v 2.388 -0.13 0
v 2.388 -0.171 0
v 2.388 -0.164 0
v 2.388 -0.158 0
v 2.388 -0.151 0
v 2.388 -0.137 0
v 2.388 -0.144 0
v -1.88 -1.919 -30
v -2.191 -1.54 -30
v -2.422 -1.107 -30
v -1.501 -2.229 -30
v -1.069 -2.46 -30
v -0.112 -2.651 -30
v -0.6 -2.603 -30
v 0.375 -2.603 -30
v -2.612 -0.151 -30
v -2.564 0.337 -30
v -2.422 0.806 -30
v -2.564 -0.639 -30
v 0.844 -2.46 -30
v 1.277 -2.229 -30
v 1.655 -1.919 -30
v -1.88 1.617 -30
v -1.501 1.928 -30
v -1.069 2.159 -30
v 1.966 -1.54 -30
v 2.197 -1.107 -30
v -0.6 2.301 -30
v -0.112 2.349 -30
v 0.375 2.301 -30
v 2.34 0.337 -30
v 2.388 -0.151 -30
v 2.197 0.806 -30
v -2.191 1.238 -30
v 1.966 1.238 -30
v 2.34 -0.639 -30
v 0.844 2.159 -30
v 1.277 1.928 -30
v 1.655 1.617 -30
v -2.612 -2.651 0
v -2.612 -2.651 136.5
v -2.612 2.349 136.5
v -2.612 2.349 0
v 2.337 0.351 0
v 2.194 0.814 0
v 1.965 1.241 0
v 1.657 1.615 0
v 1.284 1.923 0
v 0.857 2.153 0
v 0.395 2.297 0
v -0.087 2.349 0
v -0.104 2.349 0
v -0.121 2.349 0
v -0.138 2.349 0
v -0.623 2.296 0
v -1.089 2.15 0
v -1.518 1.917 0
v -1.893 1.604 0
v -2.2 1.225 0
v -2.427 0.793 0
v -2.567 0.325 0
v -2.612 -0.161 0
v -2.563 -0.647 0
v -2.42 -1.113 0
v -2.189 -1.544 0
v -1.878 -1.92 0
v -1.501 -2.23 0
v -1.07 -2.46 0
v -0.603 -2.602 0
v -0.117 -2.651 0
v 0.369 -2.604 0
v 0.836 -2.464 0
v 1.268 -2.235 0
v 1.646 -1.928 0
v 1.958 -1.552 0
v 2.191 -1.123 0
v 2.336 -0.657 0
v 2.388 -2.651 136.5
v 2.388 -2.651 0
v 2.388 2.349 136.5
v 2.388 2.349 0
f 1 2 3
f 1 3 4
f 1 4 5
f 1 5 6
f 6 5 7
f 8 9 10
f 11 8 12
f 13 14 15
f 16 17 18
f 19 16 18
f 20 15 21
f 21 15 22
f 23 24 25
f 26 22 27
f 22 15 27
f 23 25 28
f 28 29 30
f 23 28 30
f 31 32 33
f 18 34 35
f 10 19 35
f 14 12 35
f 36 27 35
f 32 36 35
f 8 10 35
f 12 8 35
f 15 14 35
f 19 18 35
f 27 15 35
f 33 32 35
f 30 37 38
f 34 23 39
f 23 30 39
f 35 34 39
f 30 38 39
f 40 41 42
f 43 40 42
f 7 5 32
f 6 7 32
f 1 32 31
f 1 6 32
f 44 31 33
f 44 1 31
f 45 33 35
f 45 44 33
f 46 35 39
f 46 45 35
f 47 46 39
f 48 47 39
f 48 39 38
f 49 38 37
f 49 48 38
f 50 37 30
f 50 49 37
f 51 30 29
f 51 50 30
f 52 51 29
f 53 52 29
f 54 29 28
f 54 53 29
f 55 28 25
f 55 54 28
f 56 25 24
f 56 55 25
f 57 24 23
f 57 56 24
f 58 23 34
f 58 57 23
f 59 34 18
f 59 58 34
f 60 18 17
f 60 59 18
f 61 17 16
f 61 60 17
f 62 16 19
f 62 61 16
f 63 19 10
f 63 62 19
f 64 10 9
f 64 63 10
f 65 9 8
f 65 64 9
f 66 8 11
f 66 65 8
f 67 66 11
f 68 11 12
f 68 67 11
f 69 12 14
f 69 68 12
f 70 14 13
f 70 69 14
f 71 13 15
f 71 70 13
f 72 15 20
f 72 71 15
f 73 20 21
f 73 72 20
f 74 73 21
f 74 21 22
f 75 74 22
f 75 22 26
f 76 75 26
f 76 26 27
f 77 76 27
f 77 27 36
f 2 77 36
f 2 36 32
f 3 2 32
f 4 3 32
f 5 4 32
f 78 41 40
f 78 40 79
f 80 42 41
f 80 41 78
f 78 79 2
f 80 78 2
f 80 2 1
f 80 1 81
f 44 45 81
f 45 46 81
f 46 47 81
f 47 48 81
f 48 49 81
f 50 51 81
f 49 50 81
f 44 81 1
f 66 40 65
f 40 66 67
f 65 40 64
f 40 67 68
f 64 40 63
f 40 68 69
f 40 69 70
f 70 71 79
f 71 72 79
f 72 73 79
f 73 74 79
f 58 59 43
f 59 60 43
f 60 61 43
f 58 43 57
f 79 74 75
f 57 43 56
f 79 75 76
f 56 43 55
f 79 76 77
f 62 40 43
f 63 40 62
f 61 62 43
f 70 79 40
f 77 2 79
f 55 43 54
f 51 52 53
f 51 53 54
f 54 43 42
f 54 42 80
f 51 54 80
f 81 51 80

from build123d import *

# Parameters (mm, degrees)
F0_W     = 5
F0_H     = 5
F2_DEPTH = 136.5
F1_R     = 2.5
F3_DEPTH = 30


with BuildPart() as f2:
    # F0 (on Top) → F2 (new body)
    with BuildSketch(Plane.XY):
        with Locations((-0.112459, -0.150917)):
            Rectangle(F0_W, F0_H)
    extrude(amount=F2_DEPTH)

    # F1 (on Top) → F3 (join)
    with BuildSketch(Plane.XY):
        with Locations((-0.112376, -0.150785)):
            Circle(F1_R)
    extrude(amount=-F3_DEPTH)


solid = f2.part
